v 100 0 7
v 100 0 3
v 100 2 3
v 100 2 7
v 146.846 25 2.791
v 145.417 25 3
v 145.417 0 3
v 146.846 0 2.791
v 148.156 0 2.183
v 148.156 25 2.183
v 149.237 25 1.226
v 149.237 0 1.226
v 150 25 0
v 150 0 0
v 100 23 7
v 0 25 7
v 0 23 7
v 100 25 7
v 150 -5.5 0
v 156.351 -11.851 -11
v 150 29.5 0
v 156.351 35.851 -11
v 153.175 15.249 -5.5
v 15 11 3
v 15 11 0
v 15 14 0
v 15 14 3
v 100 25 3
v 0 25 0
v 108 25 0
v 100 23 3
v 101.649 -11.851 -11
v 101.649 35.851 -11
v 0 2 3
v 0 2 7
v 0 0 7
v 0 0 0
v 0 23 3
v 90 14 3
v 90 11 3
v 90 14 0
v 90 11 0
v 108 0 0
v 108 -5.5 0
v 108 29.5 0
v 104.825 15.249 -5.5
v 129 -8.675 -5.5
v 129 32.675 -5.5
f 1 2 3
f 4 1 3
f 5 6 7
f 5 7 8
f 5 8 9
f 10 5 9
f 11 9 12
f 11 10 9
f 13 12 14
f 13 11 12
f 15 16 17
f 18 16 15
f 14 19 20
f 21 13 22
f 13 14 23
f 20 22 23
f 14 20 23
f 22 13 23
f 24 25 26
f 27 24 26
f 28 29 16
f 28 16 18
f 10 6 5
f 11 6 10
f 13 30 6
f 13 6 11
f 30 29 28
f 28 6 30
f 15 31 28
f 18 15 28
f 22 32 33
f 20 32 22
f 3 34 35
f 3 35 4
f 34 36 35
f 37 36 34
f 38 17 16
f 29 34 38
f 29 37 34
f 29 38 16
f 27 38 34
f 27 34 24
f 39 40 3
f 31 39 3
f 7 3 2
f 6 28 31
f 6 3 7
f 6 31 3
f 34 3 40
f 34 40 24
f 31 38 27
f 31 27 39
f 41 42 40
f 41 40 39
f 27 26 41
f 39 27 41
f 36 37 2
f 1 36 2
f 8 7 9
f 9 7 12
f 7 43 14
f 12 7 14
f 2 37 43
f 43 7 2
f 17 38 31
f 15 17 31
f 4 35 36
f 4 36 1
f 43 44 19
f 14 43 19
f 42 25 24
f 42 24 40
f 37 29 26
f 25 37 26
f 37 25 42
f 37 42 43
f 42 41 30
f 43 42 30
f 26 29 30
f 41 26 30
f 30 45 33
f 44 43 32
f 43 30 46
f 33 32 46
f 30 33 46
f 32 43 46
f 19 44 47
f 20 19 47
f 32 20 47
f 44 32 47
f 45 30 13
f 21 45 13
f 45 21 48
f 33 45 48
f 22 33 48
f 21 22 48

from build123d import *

# Parameters (mm, degrees)
F0_W        = 150
F0_H        = 25
F1_DEPTH    = 3
F2_W        = 100
F2_H        = 2
F3_DEPTH    = 7
F4_W        = 42
F4_H        = 5.5
F4_H_2      = 29.5
F5_DEPTH    = 11
F5_TAPER    = -30
F6_W        = 75
F6_H        = 3
F7_DEPTH    = 7.001
F8_T1_DEPTH = 47.9128784748


# Not quite as in the source:
# - a fillet or chamfer that OpenCascade refuses, or shapes differently, is made with other operations: its cross-section is extruded or revolved along the edge and cut away or added


with BuildPart() as f1:
    # F0 (on Top) → F1 (new body)
    with BuildSketch(Plane.XY):
        with Locations((75, 12.5)):
            Rectangle(F0_W, F0_H)
    extrude(amount=F1_DEPTH)

    # F2 (on Top) → F3 (join)
    with BuildSketch(Plane.XY):
        with Locations((50, 24)):
            Rectangle(F2_W, F2_H)
        with Locations((50, 1)):
            Rectangle(F2_W, F2_H)
    extrude(amount=F3_DEPTH)

    # F4 (on Top) → F5 (join)
    with BuildSketch(Plane.XY):
        with Locations((129, -2.75)):
            Rectangle(F4_W, F4_H)
        with Locations((129, 14.75)):
            Rectangle(F4_W, F4_H_2)
    extrude(amount=-F5_DEPTH, taper=F5_TAPER)

    # F6 (on Top) → F7 (cut, through all)
    with BuildSketch(Plane.XY):
        with Locations((52.5, 12.5)):
            Rectangle(F6_W, F6_H)
    extrude(amount=F7_DEPTH, mode=Mode.SUBTRACT)

    # F8: fillet of radius 5 on 1 edges, made by hand

    # F8_s2 → F8_t1 (cut)
    with BuildSketch(Plane.XZ.offset(-36.4564392374)):
        with BuildLine():
            ThreePointArc((145.417424305, 3), (148.1560370926, 2.1833001327), (150, 0))
            Line((150, 0), (150.0916515139, 0.04))
            ThreePointArc((150.0916515139, 0.04), (150.1, 1.5), (150.1, 3))
            Line((150.1, 3), (150, 3.1))
            Line((150, 3.1), (145.417424305, 3.1))
            Line((145.417424305, 3.1), (145.417424305, 3))
        make_face()
    extrude(amount=F8_T1_DEPTH, mode=Mode.SUBTRACT)


solid = f1.part
